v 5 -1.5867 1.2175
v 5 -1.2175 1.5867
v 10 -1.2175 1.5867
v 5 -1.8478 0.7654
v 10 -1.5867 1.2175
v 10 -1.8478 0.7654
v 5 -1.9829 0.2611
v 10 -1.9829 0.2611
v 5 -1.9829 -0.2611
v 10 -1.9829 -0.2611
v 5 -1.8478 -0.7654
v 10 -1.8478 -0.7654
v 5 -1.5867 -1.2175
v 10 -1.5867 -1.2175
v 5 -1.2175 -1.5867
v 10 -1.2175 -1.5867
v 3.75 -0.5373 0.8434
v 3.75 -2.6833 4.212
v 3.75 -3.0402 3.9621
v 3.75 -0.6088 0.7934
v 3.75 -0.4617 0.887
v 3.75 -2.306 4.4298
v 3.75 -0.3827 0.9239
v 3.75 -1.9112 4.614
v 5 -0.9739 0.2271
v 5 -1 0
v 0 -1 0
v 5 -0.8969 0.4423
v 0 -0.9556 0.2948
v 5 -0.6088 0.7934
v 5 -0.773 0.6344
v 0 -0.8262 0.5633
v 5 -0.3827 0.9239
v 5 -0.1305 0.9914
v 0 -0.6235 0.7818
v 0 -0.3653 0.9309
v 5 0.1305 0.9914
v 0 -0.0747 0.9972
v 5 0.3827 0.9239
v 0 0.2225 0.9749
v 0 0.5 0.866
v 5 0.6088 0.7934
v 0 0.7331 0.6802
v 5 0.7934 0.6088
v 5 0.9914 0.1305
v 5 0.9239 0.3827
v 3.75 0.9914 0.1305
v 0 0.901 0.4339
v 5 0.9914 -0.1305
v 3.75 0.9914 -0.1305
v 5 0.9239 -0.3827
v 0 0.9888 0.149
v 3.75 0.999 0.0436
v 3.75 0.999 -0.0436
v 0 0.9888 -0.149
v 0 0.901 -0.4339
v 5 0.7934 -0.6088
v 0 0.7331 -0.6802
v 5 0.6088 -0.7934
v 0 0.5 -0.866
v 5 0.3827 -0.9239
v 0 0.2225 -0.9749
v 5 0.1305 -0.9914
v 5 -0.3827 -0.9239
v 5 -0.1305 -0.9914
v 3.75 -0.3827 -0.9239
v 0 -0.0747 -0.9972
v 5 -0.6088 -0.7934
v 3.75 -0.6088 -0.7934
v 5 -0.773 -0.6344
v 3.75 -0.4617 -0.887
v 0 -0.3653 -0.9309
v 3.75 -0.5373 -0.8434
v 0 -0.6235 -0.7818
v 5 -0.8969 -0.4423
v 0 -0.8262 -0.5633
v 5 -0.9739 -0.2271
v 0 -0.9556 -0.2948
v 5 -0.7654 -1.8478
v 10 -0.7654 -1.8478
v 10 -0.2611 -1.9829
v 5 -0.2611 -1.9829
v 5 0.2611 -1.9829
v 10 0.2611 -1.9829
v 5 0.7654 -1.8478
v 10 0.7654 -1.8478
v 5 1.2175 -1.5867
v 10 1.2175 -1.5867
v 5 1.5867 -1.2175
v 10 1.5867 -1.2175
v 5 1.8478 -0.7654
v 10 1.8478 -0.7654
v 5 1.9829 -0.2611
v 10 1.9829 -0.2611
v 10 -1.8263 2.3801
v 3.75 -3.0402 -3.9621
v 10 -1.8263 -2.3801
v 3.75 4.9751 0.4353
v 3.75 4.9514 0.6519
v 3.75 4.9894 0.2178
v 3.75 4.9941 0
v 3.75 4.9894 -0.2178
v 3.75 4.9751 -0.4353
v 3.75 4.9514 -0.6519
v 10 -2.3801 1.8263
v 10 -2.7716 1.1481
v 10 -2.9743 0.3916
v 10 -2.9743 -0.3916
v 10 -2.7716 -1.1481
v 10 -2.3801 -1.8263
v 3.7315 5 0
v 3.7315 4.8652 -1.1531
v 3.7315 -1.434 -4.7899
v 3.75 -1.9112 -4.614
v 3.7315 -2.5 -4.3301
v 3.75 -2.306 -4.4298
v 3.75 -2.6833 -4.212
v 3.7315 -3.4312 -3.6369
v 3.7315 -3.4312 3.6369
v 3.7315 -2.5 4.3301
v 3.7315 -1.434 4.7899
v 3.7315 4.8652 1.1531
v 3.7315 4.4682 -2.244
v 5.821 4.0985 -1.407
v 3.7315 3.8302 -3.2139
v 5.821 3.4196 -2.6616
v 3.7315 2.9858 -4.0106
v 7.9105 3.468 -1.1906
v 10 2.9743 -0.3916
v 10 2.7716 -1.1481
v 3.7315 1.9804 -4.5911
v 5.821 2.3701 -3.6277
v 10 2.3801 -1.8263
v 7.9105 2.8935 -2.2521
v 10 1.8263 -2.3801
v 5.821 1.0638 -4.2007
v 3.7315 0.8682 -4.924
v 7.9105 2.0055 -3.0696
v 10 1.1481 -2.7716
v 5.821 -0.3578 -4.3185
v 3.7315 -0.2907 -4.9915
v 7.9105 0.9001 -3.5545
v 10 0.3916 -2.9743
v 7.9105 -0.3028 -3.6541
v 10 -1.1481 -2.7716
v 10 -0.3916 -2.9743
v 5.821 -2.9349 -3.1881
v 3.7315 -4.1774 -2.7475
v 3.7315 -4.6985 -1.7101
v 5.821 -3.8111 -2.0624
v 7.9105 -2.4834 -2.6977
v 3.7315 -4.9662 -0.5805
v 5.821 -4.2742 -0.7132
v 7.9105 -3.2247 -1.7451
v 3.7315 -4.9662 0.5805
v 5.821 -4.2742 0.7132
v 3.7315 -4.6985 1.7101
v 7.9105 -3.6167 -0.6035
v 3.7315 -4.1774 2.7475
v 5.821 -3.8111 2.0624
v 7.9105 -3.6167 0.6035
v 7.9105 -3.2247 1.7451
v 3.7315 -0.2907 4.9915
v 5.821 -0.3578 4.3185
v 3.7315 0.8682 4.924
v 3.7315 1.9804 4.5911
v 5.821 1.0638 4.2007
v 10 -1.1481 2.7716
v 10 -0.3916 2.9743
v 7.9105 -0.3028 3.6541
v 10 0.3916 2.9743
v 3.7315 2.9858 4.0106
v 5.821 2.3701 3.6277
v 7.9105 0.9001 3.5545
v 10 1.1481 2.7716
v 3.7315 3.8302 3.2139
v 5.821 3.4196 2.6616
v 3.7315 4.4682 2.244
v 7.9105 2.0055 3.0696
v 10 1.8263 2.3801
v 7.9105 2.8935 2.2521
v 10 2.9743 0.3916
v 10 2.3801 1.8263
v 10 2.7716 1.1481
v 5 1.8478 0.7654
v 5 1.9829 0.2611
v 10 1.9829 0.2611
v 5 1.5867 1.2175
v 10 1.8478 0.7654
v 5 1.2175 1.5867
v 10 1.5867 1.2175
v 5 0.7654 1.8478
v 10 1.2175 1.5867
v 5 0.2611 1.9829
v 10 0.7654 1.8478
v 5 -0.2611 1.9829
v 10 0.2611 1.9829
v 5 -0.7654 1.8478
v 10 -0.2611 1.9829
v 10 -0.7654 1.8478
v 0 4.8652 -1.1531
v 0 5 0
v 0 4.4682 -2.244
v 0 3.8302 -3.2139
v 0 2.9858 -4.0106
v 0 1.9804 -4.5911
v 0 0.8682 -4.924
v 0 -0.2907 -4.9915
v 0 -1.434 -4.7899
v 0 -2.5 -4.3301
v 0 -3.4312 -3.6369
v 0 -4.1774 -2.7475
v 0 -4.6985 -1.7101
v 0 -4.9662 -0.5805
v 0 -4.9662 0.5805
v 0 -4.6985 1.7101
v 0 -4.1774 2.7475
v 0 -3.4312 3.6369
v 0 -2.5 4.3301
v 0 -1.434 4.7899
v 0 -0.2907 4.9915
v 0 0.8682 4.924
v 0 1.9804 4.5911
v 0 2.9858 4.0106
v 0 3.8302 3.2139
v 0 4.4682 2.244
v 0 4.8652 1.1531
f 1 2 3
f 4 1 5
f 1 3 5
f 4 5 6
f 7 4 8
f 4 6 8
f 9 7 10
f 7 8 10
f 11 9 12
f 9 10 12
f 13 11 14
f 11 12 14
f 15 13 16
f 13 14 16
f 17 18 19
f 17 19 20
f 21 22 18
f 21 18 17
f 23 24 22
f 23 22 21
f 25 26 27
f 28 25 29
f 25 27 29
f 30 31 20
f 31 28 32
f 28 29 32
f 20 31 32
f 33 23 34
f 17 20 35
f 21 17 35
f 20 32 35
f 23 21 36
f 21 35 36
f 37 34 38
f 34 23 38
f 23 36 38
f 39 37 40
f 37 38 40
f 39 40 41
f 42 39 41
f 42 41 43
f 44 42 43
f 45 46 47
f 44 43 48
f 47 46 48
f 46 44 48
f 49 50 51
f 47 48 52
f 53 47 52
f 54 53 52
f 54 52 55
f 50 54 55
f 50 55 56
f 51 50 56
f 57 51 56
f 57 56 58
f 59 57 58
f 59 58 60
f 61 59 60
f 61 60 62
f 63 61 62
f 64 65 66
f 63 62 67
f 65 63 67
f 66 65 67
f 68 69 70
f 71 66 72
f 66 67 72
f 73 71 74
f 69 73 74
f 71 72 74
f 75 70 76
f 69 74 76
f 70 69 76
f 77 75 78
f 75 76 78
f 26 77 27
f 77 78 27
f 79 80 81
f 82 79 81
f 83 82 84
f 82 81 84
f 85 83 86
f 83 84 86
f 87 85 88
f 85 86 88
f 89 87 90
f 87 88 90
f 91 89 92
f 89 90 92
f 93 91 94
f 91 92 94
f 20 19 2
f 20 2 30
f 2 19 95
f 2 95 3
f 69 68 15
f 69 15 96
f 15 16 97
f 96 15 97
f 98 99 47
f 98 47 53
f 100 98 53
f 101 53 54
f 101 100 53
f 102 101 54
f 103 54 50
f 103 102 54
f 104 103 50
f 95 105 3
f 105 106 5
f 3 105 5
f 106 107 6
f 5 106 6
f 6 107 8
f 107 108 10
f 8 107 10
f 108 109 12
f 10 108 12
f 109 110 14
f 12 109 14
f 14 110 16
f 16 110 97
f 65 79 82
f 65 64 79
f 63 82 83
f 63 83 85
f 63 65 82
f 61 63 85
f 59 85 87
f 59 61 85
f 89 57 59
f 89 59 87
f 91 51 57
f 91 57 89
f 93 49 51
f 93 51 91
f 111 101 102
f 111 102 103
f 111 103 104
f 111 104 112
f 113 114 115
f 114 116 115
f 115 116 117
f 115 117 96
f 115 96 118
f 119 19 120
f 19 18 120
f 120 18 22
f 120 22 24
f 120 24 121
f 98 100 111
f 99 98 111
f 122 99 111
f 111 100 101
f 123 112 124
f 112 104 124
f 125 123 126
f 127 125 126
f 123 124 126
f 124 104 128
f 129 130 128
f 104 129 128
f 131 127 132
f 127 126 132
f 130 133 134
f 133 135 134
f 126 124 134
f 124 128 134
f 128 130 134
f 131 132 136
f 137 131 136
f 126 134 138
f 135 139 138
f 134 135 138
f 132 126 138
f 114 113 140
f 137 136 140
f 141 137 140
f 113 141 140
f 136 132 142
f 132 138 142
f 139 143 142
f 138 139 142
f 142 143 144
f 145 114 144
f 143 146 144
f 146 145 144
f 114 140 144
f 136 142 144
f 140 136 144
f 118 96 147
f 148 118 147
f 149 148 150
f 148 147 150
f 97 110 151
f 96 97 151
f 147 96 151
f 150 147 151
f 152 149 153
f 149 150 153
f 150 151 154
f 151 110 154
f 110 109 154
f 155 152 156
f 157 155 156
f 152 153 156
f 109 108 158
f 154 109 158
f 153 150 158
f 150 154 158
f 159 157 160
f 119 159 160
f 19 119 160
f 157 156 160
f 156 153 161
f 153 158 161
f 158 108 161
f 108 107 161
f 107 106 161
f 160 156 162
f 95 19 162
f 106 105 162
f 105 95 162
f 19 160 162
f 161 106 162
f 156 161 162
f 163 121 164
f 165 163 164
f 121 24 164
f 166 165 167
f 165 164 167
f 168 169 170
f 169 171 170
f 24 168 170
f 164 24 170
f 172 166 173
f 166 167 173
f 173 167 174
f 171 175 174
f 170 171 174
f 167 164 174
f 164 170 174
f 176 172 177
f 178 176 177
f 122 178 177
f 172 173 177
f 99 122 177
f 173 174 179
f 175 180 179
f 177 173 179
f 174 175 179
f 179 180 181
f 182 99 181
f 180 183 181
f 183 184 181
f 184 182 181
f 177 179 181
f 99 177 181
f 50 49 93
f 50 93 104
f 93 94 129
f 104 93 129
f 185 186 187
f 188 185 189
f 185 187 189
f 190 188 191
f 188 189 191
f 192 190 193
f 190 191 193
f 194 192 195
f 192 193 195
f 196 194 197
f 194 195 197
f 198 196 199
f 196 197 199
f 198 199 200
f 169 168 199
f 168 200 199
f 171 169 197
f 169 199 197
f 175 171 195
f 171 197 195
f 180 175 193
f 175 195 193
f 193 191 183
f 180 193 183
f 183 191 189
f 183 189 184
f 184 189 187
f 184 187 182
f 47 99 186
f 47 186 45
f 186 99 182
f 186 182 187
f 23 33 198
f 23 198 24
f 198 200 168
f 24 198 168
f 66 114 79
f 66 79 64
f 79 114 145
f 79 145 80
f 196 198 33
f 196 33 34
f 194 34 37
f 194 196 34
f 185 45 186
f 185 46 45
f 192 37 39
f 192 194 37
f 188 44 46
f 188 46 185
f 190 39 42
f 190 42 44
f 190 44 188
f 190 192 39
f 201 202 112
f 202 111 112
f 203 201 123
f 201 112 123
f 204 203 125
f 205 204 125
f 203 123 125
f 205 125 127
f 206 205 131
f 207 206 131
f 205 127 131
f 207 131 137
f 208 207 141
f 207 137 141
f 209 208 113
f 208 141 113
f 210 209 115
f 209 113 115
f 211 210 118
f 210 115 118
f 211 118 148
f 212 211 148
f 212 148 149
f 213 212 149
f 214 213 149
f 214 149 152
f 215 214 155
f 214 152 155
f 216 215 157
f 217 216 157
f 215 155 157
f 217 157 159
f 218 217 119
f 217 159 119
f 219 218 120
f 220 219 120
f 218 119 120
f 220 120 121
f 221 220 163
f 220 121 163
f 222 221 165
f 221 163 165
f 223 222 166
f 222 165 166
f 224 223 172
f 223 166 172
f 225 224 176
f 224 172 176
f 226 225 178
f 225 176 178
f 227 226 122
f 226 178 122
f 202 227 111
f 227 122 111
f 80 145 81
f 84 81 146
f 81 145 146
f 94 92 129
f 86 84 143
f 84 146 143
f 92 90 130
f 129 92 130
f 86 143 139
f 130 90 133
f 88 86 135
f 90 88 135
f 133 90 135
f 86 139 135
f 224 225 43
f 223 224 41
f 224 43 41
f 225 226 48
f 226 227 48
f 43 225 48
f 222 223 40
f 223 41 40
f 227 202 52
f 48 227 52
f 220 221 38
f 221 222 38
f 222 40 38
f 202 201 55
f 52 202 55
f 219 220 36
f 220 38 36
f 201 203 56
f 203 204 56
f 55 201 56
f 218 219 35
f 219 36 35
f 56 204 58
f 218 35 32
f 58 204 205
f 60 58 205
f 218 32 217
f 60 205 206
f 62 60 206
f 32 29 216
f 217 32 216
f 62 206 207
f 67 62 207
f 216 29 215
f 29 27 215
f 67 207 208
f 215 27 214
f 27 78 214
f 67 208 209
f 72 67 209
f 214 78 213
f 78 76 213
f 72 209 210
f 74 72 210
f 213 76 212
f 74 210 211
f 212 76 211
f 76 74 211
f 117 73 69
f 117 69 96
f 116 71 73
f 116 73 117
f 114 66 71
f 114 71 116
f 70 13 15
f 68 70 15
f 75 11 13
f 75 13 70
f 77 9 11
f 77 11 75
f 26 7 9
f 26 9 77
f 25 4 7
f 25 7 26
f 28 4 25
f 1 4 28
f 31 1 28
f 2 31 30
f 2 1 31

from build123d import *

# Parameters (mm, degrees)
SKETCH3_R          = 2
CUT_EXTRUDE1_DEPTH = 5
SKETCH4_R          = 1
CUT_EXTRUDE2_DEPTH = 5
CUT_EXTRUDE3_DEPTH = 6.25


with BuildPart() as part:
    # Sketch1 → Revolve1 (revolve)
    with BuildSketch(Plane.XY):
        Polygon((0, 0), (0, 5), (3.731538273, 5), (10, 3), (10, 0), align=None)
    revolve(axis=Axis((10, 0, 0), (-1, 0, 0)))

    # Sketch3 → Cut-Extrude1 (cut)
    with BuildSketch(Plane(origin=(10, 0, 0), x_dir=(0, 0, -1), z_dir=(1, 0, 0))):
        with Locations(Location((0, 0, 0), (0, 0, 90))):
            Circle(SKETCH3_R)
    extrude(amount=-CUT_EXTRUDE1_DEPTH, mode=Mode.SUBTRACT)

    # Sketch4 → Cut-Extrude2 (cut)
    with BuildSketch(Plane.ZY):
        with Locations(Location((0, 0, 0), (0, 0, 270))):
            Circle(SKETCH4_R)
    extrude(amount=-CUT_EXTRUDE2_DEPTH, mode=Mode.SUBTRACT)

    # Sketch5 → Cut-Extrude3 (cut)
    with BuildSketch(Plane(origin=(10, 0, 0), x_dir=(0, 0, -1), z_dir=(1, 0, 0))):
        with BuildLine():
            Line((-0.652630961, 4.957224307), (0, 0))
            Line((0, 0), (0.652630961, 4.957224307))
            ThreePointArc((0.652630961, 4.957224307), (0, 5), (-0.652630961, 4.957224307))
        make_face()
        with BuildLine():
            Line((4.619397663, -1.913417162), (0, 0))
            Line((0, 0), (3.966766701, -3.043807145))
            ThreePointArc((3.966766701, -3.043807145), (4.330127019, -2.5), (4.619397663, -1.913417162))
        make_face()
        with BuildLine():
            Line((-3.966766701, -3.043807145), (0, 0))
            Line((0, 0), (-4.619397663, -1.913417162))
            ThreePointArc((-4.619397663, -1.913417162), (-4.330127019, -2.5), (-3.966766701, -3.043807145))
        make_face()
    extrude(amount=-CUT_EXTRUDE3_DEPTH, mode=Mode.SUBTRACT)


solid = part.part
